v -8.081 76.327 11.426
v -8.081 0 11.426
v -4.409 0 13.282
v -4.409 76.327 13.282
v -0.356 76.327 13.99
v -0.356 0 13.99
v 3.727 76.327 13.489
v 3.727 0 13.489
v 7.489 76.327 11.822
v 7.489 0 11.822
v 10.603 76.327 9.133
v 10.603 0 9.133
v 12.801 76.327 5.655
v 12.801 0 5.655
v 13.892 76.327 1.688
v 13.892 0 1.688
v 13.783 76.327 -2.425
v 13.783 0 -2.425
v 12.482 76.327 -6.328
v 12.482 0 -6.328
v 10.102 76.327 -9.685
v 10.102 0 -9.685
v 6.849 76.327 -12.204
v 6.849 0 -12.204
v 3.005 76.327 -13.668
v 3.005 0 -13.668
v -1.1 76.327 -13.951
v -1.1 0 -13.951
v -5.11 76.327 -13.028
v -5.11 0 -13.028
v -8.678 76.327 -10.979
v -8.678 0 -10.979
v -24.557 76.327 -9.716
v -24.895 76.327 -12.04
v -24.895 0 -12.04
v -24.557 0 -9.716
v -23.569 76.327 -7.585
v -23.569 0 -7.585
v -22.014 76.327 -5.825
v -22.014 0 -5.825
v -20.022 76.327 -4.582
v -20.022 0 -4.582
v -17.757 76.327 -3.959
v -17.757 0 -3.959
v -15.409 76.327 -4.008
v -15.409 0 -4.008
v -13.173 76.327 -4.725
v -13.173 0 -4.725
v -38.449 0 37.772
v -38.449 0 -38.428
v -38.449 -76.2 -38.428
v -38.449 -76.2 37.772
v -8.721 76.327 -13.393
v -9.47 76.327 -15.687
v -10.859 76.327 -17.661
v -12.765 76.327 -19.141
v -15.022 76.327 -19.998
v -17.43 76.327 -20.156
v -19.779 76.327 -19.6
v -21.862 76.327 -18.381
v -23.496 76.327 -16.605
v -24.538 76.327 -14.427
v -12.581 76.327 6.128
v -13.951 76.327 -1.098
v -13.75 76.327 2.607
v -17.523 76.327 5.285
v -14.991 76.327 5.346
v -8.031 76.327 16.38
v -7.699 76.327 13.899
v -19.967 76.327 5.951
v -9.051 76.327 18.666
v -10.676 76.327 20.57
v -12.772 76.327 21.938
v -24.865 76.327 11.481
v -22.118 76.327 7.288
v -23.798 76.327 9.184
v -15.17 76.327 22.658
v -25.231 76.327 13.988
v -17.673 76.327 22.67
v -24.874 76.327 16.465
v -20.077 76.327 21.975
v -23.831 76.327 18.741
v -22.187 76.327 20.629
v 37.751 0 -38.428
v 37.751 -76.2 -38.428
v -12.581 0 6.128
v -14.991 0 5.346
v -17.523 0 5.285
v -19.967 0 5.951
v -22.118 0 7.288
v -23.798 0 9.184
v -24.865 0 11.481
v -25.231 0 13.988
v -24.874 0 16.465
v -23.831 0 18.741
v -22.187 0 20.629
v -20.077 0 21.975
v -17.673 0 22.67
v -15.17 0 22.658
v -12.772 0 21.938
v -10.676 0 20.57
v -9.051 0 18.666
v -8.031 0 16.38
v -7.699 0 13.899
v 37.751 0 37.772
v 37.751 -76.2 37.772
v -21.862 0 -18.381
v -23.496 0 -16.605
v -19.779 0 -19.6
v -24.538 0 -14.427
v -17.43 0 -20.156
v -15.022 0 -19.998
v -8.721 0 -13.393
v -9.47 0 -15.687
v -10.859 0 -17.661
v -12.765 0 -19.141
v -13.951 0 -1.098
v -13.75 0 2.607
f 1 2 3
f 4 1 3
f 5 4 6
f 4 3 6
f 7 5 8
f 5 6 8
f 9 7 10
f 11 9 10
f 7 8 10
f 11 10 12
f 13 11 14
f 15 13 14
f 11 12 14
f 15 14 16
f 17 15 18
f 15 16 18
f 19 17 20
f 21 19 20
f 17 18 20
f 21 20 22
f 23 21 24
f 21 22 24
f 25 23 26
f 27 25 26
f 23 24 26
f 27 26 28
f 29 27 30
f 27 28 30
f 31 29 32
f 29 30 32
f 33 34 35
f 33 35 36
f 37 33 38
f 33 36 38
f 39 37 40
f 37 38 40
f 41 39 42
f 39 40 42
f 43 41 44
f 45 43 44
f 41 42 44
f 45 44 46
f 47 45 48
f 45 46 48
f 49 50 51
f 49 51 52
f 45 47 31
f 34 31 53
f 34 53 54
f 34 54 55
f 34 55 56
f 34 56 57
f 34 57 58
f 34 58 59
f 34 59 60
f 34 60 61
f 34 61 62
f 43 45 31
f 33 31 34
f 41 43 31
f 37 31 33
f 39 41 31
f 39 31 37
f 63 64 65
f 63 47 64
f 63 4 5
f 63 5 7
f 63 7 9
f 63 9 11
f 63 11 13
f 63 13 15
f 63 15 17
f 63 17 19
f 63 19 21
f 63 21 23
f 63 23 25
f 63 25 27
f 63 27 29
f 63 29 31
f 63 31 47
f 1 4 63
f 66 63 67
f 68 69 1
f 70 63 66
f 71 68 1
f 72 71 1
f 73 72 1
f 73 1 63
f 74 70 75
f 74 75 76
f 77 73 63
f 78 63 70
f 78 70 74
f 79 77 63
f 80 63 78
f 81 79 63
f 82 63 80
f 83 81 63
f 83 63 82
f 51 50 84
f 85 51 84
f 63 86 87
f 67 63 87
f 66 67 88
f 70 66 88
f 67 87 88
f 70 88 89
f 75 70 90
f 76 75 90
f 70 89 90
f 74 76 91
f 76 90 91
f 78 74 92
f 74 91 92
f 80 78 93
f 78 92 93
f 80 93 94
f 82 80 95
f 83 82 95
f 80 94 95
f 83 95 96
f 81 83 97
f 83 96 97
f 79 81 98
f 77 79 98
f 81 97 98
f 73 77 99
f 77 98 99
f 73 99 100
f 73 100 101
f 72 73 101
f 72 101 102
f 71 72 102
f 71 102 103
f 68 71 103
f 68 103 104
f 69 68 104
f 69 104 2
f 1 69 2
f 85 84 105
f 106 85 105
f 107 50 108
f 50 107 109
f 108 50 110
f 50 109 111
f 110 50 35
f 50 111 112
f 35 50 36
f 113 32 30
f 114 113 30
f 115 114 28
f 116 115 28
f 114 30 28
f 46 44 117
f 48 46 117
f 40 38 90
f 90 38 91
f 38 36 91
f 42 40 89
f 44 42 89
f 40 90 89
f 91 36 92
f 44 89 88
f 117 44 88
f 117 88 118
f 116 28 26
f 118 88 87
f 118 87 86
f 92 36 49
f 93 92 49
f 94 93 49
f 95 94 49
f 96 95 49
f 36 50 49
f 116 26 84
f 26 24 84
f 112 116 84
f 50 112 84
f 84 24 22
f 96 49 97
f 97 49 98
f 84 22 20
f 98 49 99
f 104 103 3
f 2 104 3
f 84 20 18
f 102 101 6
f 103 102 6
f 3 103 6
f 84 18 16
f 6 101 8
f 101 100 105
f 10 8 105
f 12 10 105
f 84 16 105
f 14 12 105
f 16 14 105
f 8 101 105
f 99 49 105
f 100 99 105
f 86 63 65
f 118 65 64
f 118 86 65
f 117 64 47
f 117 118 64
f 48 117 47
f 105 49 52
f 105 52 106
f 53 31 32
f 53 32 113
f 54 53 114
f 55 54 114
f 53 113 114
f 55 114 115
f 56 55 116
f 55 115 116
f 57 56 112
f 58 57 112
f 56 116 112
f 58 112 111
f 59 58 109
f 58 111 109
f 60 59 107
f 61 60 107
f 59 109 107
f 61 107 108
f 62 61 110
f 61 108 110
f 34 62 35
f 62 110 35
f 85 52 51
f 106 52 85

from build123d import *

# Parameters (mm, degrees)
F0_W     = 76.2
F0_H     = 76.2
F1_DEPTH = 76.2
F2_R     = 13.9945957695
F3_DEPTH = 76.2
F5_DEPTH = 76.2
F6_DEPTH = 0.127


# Not quite as in the source:
# - a feature of the source that left no trace in its solid (it failed there, or was rolled back) is left out


with BuildPart() as f1:
    # F0 (on Front) → F1 (new body)
    with BuildSketch(Plane.XZ):
        with Locations((-0.348880887, -0.3284779671)):
            Rectangle(F0_W, F0_H)
    extrude(amount=F1_DEPTH)

    # F2 (on face) → F3 (join)
    with BuildSketch(Plane(origin=(0, 0, 0), x_dir=(-1, 0, 0), z_dir=(0, 1, 0))):
        Circle(F2_R)
    extrude(amount=F3_DEPTH)

    # F4 (on face) → F5 (join)
    with BuildSketch(Plane(origin=(0, 0, 0), x_dir=(-1, 0, 0), z_dir=(0, 1, 0))):
        with BuildLine():
            ThreePointArc((12.5814202737, 6.1283419167), (21.0911235736, 6.5413963555), (25.2311478041, 13.9875942841))
            ThreePointArc((25.2311478041, 13.9875942841), (15.1695556684, 22.6577098126), (8.081240073, 11.4255096006))
            ThreePointArc((8.081240073, 11.4255096006), (10.6654291765, 9.0607577626), (12.5814202737, 6.1283419167))
        make_face()
        with BuildLine():
            ThreePointArc((13.1726915392, -4.7253474332), (11.363857458, -8.1677080277), (8.6776055388, -10.9794295328))
            ThreePointArc((8.6776055388, -10.9794295328), (16.220264771, -20.1665195025), (24.895431247, -12.0402770117))
            ThreePointArc((24.895431247, -12.0402770117), (21.0629315641, -5.1313910488), (13.1726915392, -4.7253474332))
        make_face()
        with BuildLine():
            ThreePointArc((13.1726915392, -4.7253474332), (10.1390684725, -7.2873978983), (8.6776055388, -10.9794295328))
            ThreePointArc((8.6776055388, -10.9794295328), (11.363857458, -8.1677080277), (13.1726915392, -4.7253474332))
        make_face()
    extrude(amount=F5_DEPTH)

    # F6 (add): a face of the model
    f6_faces = [f1.faces().sort_by_distance(p)[0] for p in [
        (-6.9646133447, 76.2, 0.8386205015),
    ]]
    extrude(f6_faces, amount=F6_DEPTH)


solid = f1.part
